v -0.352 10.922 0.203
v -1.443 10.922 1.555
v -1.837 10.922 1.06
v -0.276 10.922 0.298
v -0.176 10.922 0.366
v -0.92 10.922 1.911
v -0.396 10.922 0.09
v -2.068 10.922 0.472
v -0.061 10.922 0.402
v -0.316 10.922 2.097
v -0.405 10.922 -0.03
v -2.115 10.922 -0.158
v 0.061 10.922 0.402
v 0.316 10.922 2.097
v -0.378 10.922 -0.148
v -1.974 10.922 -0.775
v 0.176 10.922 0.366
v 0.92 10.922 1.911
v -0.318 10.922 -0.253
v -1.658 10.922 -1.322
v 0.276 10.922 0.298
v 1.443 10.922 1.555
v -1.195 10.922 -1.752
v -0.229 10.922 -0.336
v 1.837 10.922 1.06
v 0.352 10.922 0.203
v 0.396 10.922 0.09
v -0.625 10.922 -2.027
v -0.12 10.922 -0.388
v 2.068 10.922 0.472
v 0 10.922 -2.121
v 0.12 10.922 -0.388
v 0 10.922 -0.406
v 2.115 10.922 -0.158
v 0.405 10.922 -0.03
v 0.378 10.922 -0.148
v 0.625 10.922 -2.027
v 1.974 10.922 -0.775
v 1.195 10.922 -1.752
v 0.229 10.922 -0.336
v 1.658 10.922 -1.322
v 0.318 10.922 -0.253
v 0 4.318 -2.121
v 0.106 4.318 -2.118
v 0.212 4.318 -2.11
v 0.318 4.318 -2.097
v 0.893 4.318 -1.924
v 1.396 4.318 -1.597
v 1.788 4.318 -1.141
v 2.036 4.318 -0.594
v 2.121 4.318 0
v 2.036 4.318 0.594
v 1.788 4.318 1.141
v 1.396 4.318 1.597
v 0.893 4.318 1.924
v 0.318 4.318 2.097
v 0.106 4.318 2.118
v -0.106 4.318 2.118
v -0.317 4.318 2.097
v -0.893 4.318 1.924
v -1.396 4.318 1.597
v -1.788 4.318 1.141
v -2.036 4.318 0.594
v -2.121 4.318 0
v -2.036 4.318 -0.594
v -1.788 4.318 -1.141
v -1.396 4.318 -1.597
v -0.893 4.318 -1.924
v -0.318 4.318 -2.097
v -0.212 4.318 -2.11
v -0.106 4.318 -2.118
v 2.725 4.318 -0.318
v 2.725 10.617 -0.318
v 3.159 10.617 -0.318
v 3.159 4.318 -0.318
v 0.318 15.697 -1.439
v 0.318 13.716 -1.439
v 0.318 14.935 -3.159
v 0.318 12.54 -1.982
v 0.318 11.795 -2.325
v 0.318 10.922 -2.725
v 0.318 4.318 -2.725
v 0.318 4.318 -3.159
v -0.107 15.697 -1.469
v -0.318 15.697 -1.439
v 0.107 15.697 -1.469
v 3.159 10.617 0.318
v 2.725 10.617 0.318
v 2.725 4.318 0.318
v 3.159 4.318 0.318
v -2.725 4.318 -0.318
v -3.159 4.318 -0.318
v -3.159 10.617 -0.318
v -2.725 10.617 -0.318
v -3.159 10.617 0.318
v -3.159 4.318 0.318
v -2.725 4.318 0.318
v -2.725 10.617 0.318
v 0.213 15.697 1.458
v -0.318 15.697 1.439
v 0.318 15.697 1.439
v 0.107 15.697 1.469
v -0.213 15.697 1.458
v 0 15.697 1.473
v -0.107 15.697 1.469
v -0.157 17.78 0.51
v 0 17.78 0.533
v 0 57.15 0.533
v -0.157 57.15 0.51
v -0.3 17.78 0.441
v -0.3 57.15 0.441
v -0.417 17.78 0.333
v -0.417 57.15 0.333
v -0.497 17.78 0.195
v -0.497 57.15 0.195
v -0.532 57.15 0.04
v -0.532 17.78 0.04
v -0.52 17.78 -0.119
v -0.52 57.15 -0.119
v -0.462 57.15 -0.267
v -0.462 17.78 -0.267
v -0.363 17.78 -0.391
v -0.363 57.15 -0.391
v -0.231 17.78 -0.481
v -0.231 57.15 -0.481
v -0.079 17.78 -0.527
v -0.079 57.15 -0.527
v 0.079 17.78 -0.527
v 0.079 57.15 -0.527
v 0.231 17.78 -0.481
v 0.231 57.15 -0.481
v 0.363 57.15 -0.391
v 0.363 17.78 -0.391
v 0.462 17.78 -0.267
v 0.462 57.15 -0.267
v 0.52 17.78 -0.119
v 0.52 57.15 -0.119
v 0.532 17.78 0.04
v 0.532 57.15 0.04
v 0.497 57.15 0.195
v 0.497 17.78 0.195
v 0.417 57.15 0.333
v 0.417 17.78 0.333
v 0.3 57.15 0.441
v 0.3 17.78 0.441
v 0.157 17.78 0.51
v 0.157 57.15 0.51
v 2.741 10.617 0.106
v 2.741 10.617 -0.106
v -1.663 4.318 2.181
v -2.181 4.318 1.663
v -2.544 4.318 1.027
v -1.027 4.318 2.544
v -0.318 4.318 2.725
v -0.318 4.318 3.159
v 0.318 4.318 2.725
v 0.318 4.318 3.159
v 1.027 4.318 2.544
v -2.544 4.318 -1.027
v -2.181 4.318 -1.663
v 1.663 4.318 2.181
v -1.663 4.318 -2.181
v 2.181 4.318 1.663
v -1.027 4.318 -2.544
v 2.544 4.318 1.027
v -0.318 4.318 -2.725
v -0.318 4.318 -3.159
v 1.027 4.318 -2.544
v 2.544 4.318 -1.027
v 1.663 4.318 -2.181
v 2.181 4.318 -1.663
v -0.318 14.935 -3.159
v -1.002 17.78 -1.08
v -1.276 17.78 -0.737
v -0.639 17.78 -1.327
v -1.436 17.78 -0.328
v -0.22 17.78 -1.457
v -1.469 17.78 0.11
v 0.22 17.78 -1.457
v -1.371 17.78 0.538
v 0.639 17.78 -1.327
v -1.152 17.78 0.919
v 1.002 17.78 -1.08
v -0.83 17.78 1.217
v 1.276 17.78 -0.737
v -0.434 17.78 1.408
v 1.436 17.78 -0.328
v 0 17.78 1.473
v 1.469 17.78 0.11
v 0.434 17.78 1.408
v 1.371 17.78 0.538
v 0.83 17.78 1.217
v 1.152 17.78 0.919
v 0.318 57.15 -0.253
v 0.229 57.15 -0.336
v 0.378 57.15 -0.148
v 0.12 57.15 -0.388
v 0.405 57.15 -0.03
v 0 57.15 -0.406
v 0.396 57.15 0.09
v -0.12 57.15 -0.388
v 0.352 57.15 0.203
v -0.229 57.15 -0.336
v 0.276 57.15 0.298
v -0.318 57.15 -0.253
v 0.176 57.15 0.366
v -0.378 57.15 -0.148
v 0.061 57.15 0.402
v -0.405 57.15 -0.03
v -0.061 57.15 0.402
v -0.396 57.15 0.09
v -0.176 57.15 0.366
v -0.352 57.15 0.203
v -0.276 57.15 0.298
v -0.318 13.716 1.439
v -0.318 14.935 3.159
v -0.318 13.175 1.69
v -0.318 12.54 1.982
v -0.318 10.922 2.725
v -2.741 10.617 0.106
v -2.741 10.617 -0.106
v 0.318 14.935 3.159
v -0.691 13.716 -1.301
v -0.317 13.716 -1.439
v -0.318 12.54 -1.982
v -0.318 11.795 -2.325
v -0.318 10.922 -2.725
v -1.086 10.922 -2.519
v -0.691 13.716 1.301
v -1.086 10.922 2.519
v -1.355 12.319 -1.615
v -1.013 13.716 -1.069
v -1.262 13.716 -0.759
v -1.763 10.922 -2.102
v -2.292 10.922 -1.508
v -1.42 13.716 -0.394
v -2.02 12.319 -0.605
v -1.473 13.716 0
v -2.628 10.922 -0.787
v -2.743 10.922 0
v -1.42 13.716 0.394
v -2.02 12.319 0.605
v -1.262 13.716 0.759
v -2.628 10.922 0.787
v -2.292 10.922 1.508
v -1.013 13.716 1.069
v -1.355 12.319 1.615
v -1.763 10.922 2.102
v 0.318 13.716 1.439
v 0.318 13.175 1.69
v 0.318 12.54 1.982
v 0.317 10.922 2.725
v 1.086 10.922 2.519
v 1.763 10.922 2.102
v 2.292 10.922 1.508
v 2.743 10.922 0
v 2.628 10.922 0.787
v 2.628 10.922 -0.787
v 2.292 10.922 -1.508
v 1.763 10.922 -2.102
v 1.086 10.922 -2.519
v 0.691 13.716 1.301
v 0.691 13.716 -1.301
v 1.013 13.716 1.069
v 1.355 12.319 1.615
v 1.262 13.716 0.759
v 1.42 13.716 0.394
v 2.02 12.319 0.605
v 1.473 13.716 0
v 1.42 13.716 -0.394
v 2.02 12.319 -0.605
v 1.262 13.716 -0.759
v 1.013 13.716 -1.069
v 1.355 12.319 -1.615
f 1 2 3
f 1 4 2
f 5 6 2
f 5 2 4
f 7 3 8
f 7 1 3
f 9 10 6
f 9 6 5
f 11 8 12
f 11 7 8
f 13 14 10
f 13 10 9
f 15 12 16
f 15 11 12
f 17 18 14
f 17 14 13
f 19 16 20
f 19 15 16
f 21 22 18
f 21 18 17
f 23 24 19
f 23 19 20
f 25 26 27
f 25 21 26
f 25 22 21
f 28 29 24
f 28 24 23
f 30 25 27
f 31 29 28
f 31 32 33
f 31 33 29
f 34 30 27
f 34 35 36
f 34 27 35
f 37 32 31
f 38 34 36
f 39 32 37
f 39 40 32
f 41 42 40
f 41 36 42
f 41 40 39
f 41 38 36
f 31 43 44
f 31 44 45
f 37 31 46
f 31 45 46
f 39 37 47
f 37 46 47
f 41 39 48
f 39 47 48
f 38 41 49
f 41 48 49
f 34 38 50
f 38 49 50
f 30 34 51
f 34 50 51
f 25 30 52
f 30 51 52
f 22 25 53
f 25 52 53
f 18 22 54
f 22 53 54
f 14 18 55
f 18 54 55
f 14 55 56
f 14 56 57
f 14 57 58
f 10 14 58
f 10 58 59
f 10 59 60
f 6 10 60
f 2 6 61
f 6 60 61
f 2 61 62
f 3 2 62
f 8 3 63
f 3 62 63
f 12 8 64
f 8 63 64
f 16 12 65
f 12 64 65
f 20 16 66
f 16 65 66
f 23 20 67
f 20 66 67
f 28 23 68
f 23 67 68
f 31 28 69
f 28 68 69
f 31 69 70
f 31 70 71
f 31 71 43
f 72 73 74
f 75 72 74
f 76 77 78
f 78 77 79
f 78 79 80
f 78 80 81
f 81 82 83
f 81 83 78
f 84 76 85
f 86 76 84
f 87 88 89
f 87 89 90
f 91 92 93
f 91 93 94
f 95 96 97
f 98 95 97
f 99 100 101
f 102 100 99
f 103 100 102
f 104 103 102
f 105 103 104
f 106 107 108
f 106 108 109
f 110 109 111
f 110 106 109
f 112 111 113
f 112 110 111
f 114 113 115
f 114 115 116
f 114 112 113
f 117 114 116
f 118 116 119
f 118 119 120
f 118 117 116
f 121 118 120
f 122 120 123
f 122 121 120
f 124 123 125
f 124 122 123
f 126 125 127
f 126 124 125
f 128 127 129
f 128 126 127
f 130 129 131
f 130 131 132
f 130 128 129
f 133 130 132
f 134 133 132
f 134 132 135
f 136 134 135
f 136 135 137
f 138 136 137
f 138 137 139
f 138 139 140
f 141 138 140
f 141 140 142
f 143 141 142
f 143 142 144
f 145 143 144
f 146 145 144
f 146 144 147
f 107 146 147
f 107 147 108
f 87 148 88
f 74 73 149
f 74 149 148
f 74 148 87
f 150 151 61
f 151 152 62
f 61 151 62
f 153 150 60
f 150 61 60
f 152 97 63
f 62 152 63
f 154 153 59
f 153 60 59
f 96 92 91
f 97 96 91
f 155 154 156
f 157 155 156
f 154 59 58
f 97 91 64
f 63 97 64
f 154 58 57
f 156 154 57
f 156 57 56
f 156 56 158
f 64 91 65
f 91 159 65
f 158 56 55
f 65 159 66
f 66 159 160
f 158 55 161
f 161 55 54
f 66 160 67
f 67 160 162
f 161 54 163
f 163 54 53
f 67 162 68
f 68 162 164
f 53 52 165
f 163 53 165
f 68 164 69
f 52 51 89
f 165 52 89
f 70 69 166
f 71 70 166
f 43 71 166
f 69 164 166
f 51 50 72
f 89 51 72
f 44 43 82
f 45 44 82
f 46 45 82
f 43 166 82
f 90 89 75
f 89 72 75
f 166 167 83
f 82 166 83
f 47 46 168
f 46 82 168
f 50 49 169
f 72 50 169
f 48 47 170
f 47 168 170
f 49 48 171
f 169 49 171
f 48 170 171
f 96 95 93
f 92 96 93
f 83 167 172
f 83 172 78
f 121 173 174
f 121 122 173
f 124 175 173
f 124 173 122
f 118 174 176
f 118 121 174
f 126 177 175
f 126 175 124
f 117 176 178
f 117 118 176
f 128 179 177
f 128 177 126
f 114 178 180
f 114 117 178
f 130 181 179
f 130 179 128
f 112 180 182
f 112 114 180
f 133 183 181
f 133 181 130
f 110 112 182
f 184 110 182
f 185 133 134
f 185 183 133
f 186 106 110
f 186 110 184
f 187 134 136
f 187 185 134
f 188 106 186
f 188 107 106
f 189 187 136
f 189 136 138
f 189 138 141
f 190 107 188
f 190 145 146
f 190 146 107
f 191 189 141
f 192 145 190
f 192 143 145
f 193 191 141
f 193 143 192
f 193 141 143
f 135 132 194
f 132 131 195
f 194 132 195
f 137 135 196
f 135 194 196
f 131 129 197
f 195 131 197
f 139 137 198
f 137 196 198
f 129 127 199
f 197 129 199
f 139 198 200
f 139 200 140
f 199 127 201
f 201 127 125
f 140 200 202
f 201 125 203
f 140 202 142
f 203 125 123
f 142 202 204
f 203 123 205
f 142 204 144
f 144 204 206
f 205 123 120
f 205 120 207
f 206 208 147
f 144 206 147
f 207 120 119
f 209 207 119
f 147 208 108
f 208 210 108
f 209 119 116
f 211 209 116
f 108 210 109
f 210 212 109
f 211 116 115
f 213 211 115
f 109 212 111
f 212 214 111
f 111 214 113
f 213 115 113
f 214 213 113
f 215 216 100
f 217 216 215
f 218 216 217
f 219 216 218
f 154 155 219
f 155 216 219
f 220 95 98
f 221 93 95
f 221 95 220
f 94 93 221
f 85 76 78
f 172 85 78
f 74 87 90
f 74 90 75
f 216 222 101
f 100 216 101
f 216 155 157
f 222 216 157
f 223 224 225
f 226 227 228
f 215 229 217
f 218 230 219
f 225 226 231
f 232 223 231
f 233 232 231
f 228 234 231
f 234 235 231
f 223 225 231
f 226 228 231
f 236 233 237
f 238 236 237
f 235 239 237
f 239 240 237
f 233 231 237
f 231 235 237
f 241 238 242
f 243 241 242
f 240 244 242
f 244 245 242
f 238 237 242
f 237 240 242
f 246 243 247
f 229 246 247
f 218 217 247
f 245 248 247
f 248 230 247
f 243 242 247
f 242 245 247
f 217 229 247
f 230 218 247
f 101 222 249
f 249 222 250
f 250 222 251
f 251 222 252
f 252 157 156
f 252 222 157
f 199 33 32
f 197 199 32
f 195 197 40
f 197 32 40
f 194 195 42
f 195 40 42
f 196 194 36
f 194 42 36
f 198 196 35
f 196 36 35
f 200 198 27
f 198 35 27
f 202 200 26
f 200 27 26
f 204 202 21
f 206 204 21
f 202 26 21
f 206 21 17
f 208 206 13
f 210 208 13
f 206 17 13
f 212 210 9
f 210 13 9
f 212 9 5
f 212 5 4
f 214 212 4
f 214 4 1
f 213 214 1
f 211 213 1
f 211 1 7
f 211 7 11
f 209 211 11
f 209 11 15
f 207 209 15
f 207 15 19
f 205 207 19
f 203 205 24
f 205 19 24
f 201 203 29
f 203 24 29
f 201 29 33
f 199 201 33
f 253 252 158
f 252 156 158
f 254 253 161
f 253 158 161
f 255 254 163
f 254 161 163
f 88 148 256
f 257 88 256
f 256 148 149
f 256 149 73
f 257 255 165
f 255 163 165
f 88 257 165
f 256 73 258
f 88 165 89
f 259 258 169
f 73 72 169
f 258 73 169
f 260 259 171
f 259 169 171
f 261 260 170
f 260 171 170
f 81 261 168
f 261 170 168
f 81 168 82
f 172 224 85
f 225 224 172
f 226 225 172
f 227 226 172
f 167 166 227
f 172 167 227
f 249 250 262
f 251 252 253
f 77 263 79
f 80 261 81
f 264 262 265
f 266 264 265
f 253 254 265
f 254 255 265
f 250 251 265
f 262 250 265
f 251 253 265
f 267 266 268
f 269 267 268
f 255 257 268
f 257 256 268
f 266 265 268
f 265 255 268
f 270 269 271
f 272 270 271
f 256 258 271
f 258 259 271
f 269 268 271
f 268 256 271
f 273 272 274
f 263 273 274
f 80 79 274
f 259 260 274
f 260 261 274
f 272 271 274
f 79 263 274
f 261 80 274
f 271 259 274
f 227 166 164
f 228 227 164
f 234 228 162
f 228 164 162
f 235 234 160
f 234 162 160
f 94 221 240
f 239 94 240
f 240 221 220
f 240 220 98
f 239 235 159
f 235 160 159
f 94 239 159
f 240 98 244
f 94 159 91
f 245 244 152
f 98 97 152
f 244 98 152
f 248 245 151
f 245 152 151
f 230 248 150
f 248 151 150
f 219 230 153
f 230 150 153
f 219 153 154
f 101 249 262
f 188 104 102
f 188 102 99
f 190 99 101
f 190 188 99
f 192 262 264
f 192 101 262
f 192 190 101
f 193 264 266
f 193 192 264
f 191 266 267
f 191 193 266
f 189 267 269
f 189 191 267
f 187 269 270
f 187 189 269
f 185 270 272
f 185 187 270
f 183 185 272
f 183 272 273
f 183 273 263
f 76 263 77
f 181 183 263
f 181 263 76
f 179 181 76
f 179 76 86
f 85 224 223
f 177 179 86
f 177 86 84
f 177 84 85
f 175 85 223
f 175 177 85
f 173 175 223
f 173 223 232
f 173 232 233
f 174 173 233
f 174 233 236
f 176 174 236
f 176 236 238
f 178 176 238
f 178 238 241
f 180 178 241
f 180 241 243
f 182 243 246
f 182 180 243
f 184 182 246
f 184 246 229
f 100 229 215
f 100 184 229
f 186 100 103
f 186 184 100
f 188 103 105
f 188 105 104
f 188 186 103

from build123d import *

# Parameters (mm, degrees)
SKETCH1_R           = 2.7432
BOSS_EXTRUDE1_DEPTH = 17.78
SKETCH2_R           = 3.175
SKETCH2_R_2         = 1.4732
CUT_EXTRUDE1_DEPTH  = 4.064
SKETCH4_R           = 3.175
BOSS_EXTRUDE2_DEPTH = 2.9972
SKETCH5_W           = 0.635
SKETCH5_H           = 6.318170226
BOSS_EXTRUDE3_DEPTH = 12.7
SKETCH6_W           = 6.318170226
SKETCH6_H           = 0.635
BOSS_EXTRUDE4_DEPTH = 7.62
CUT_EXTRUDE2_DEPTH  = 7.62
SKETCH8_R           = 2.1209
CUT_EXTRUDE3_DEPTH  = 10.922
CUT_EXTRUDE4_START  = -6.858
SKETCH9_R           = 0.508
CUT_EXTRUDE4_DEPTH  = 6.858
SWEEP2_PITCH        = 2.54
SWEEP2_HEIGHT       = 1.143
SWEEP2_RADIUS       = 3.175
SWEEP2_START_ANGLE  = -90
SKETCH10_W          = 0.508
SKETCH10_H          = 0.762
SWEEP3_PITCH        = 2.54
SWEEP3_HEIGHT       = 1.143
SWEEP3_RADIUS       = 3.175
SWEEP3_START_ANGLE  = 90
SKETCH17_W          = 0.508
SKETCH17_H          = 0.762
SKETCH18_R          = 0.5334
SKETCH18_R_2        = 0.4064
BOSS_EXTRUDE6_DEPTH = 46.228
INTERSECT1_DEPTH    = 4.318


# Read off the part's stored shape, not the designer's step: Intersect1
with BuildPart() as part:
    # Sketch1 → Boss-Extrude1 (new body)
    with BuildSketch(Plane(origin=(0, 0, 0), x_dir=(1, 0, 0), z_dir=(0, 1, 0))):
        with Locations(Location((0, 0, 0), (0, 0, 270))):
            Circle(SKETCH1_R)
    extrude(amount=BOSS_EXTRUDE1_DEPTH)

    # Sketch2 → Cut-Extrude1 (cut)
    with BuildSketch(Plane(origin=(0, 17.78, 0), x_dir=(1, 0, 0), z_dir=(0, 1, 0))):
        Circle(SKETCH2_R)
        with Locations(Location((0, 0, 0), (0, 0, 270))):
            Circle(SKETCH2_R_2, mode=Mode.SUBTRACT)
    extrude(amount=-CUT_EXTRUDE1_DEPTH, mode=Mode.SUBTRACT)

    # Sketch3 → Cut-Revolve1 (revolve, cut)
    with BuildSketch(Plane.XY, mode=Mode.PRIVATE) as cut_revolve1_sk:
        Polygon((1.4732, 13.716), (2.7432, 10.922), (2.7432, 13.716), align=None)
    revolve(cut_revolve1_sk.sketch.rotate(Axis((0, 13.716, 0), (0, 1, 0)), 90), axis=Axis((0, 13.716, 0), (0, 1, 0)), mode=Mode.SUBTRACT)

    # Sketch4 → Boss-Extrude2 (add)
    with BuildSketch(Plane.XZ):
        with Locations(Location((0, 0, 0), (0, 0, 270))):
            Circle(SKETCH4_R)
    extrude(amount=-BOSS_EXTRUDE2_DEPTH)

    # Sketch5 → Boss-Extrude3 (add)
    with BuildSketch(Plane(origin=(0, 2.9972, 0), x_dir=(1, 0, 0), z_dir=(0, 1, 0))):
        Rectangle(SKETCH5_W, SKETCH5_H)
    extrude(amount=BOSS_EXTRUDE3_DEPTH)

    # Sketch6 → Boss-Extrude4 (add)
    with BuildSketch(Plane(origin=(0, 2.9972, 0), x_dir=(1, 0, 0), z_dir=(0, 1, 0))):
        Rectangle(SKETCH6_W, SKETCH6_H)
    extrude(amount=BOSS_EXTRUDE4_DEPTH)

    # Sketch7 → Cut-Extrude2 (cut)
    with BuildSketch(Plane(origin=(0.3175, 0, 0), x_dir=(0, 0, -1), z_dir=(1, 0, 0))):
        Polygon((1.438579852, 15.6972), (3.159085113, 14.9352), (3.159085113, 15.6972), align=None)
        Polygon((-1.438579852, 15.6972), (-3.159085113, 15.6972), (-3.159085113, 14.9352), align=None)
    extrude(amount=-CUT_EXTRUDE2_DEPTH, mode=Mode.SUBTRACT)

    # Sketch8 → Cut-Extrude3 (cut)
    with BuildSketch(Plane.XZ):
        with Locations(Location((0, 0, 0), (0, 0, 270))):
            Circle(SKETCH8_R)
    extrude(amount=-CUT_EXTRUDE3_DEPTH, mode=Mode.SUBTRACT)

    # Sketch9 → Cut-Extrude4 (cut)
    with BuildSketch(Plane(origin=(0, 17.78, 0), x_dir=(1, 0, 0), z_dir=(0, 1, 0)).offset(CUT_EXTRUDE4_START)):
        with Locations(Location((0, 0, 0), (0, 0, 270))):
            Circle(SKETCH9_R)
    extrude(amount=CUT_EXTRUDE4_DEPTH, mode=Mode.SUBTRACT)

    # Sweep2: sweep along a helix
    with BuildLine() as sweep2_path:
        add(Helix(SWEEP2_PITCH, SWEEP2_HEIGHT, SWEEP2_RADIUS, center=(0, 0.508, 0), direction=(0, 1, 0), mode=Mode.PRIVATE).rotate(Axis((0, 0.508, 0), (0, 1, 0)), SWEEP2_START_ANGLE))
    # Sketch10 → Sweep2 (sweep)
    with BuildSketch(Plane.XY):
        with Locations((-3.429, 0.889)):
            Rectangle(SKETCH10_W, SKETCH10_H)
    sweep(path=sweep2_path.line, is_frenet=True)

    # Sweep3: sweep along a helix
    with BuildLine() as sweep3_path:
        add(Helix(SWEEP3_PITCH, SWEEP3_HEIGHT, SWEEP3_RADIUS, center=(0, 0.508, 0), direction=(0, 1, 0), mode=Mode.PRIVATE).rotate(Axis((0, 0.508, 0), (0, 1, 0)), SWEEP3_START_ANGLE))
    # Sketch17 → Sweep3 (sweep)
    with BuildSketch(Plane.XY):
        with Locations((3.429, 0.889)):
            Rectangle(SKETCH17_W, SKETCH17_H)
    sweep(path=sweep3_path.line, is_frenet=True)

    # Sketch18 → Boss-Extrude6 (add)
    with BuildSketch(Plane.XZ.offset(-10.922)):
        with Locations(Location((0, 0, 0), (0, 0, 90))):
            Circle(SKETCH18_R)
        with Locations(Location((0, 0, 0), (0, 0, 270))):
            Circle(SKETCH18_R_2, mode=Mode.SUBTRACT)
    extrude(amount=-BOSS_EXTRUDE6_DEPTH)

    # Intersect1 outline → Intersect1 (cut)
    with BuildSketch(Plane(origin=(0, 0, 0), x_dir=(1, 0, 0), z_dir=(0, 1, 0))):
        with BuildLine():
            Line((-3.175, 0), (-3.683, 0))
            add(Edge.make_bspline(
                [(-3.683, 0), (-3.683, -1.196679241), (-2.97960959, -2.164813084), (-2.276219181, -3.132946927), (-1.13810959, -3.50274115), (0, -3.872535372), (1.13810959, -3.50274115), (2.276219181, -3.132946927), (2.97960959, -2.164813084), (3.322482299, -1.692889287), (3.50274115, -1.13810959)],
                knots=[0, 0, 0, 0.1, 0.1, 0.2, 0.2, 0.3, 0.3, 0.4, 0.4, 0.45, 0.45, 0.45], degree=2, weights=[1, 0.951056516, 1, 0.951056516, 1, 0.951056516, 1, 0.951056516, 1, 0.975528258, 0.975528258]))
            Line((3.50274115, -1.13810959), (3.019604439, -0.981128957))
            ThreePointArc((3.019604439, -0.981128957), (1.992470769, -2.471980023), (0.3175, -3.159085113))
            ThreePointArc((0.3175, -3.159085113), (0, -3.175), (-0.3175, -3.159085113))
            ThreePointArc((-0.3175, -3.159085113), (-2.24506403, -2.24506403), (-3.159085113, -0.3175))
            ThreePointArc((-3.159085113, -0.3175), (-3.171018782, -0.158949311), (-3.175, 0))
        make_face()
        with BuildLine():
            ThreePointArc((-3.159085113, 0.3175), (-3.171018782, 0.158949311), (-3.175, 0))
            ThreePointArc((-3.175, 0), (-3.171018782, -0.158949311), (-3.159085113, -0.3175))
            Line((-3.159085113, -0.3175), (-3.159085113, 0.3175))
        make_face()
        with BuildLine():
            ThreePointArc((0.3175, -3.159085113), (1.992470769, -2.471980023), (3.019604439, -0.981128957))
            ThreePointArc((3.019604439, -0.981128957), (3.107113129, -0.653049008), (3.159085113, -0.3175))
            Line((3.159085113, -0.3175), (2.724764208, -0.3175))
            ThreePointArc((2.724764208, -0.3175), (1.939735322, -1.939735322), (0.3175, -2.724764208))
            Line((0.3175, -2.724764208), (0.3175, -3.159085113))
        make_face()
        with BuildLine():
            ThreePointArc((-3.019604439, 0.981128957), (-3.107113129, 0.653049008), (-3.159085113, 0.3175))
            Line((-3.159085113, 0.3175), (-2.724764208, 0.3175))
            ThreePointArc((-2.724764208, 0.3175), (-1.939735322, 1.939735322), (-0.3175, 2.724764208))
            Line((-0.3175, 2.724764208), (-0.3175, 3.159085113))
            ThreePointArc((-0.3175, 3.159085113), (-1.992470769, 2.471980023), (-3.019604439, 0.981128957))
        make_face()
        with BuildLine():
            Line((-2.724764208, 0.3175), (-3.159085113, 0.3175))
            Line((-3.159085113, 0.3175), (-3.159085113, -0.3175))
            Line((-3.159085113, -0.3175), (-2.724764208, -0.3175))
            ThreePointArc((-2.724764208, -0.3175), (-2.7432, 0), (-2.724764208, 0.3175))
        make_face()
        with BuildLine():
            Line((-2.724764208, -0.3175), (-3.159085113, -0.3175))
            ThreePointArc((-3.159085113, -0.3175), (-2.24506403, -2.24506403), (-0.3175, -3.159085113))
            Line((-0.3175, -3.159085113), (-0.3175, -2.724764208))
            ThreePointArc((-0.3175, -2.724764208), (-1.939735322, -1.939735322), (-2.724764208, -0.3175))
        make_face()
        with BuildLine():
            Line((-0.3175, -3.159085113), (0.3175, -3.159085113))
            Line((0.3175, -3.159085113), (0.3175, -2.724764208))
            Line((0.3175, -2.724764208), (0.3175, -2.097000372))
            ThreePointArc((0.3175, -2.097000372), (0, -2.1209), (-0.3175, -2.097000372))
            Line((-0.3175, -2.097000372), (-0.3175, -2.724764208))
            Line((-0.3175, -2.724764208), (-0.3175, -3.159085113))
        make_face()
        with BuildLine():
            ThreePointArc((-0.3175, -3.159085113), (0, -3.175), (0.3175, -3.159085113))
            Line((0.3175, -3.159085113), (-0.3175, -3.159085113))
        make_face()
        with BuildLine():
            Line((3.159085113, 0.3175), (3.159085113, -0.3175))
            ThreePointArc((3.159085113, -0.3175), (3.171018782, -0.158949311), (3.175, 0))
            ThreePointArc((3.175, 0), (3.171018782, 0.158949311), (3.159085113, 0.3175))
        make_face()
        with BuildLine():
            Line((2.724764208, -0.3175), (3.159085113, -0.3175))
            Line((3.159085113, -0.3175), (3.159085113, 0.3175))
            Line((3.159085113, 0.3175), (2.724764208, 0.3175))
            ThreePointArc((2.724764208, 0.3175), (2.7432, 0), (2.724764208, -0.3175))
        make_face()
        with BuildLine():
            Line((-3.50274115, 1.13810959), (-3.019604439, 0.981128957))
            ThreePointArc((-3.019604439, 0.981128957), (-1.992470769, 2.471980023), (-0.3175, 3.159085113))
            ThreePointArc((-0.3175, 3.159085113), (0, 3.175), (0.3175, 3.159085113))
            ThreePointArc((0.3175, 3.159085113), (2.24506403, 2.24506403), (3.159085113, 0.3175))
            ThreePointArc((3.159085113, 0.3175), (3.171018782, 0.158949311), (3.175, 0))
            Line((3.175, 0), (3.683, 0))
            add(Edge.make_bspline(
                [(3.683, 0), (3.683, 1.196679241), (2.97960959, 2.164813084), (2.276219181, 3.132946927), (1.13810959, 3.50274115), (0, 3.872535372), (-1.13810959, 3.50274115), (-2.276219181, 3.132946927), (-2.97960959, 2.164813084), (-3.322482299, 1.692889287), (-3.50274115, 1.13810959)],
                knots=[0, 0, 0, 0.1, 0.1, 0.2, 0.2, 0.3, 0.3, 0.4, 0.4, 0.45, 0.45, 0.45], degree=2, weights=[1, 0.951056516, 1, 0.951056516, 1, 0.951056516, 1, 0.951056516, 1, 0.975528258, 0.975528258]))
        make_face()
        with BuildLine():
            ThreePointArc((-0.3175, 2.724764208), (-1.939735322, 1.939735322), (-2.724764208, 0.3175))
            ThreePointArc((-2.724764208, 0.3175), (-2.7432, 0), (-2.724764208, -0.3175))
            ThreePointArc((-2.724764208, -0.3175), (-1.939735322, -1.939735322), (-0.3175, -2.724764208))
            Line((-0.3175, -2.724764208), (-0.3175, -2.097000372))
            ThreePointArc((-0.3175, -2.097000372), (-2.1209, 0), (-0.3175, 2.097000372))
            Line((-0.3175, 2.097000372), (-0.3175, 2.724764208))
        make_face()
        with BuildLine():
            Line((0.3175, -2.097000372), (0.3175, -2.724764208))
            ThreePointArc((0.3175, -2.724764208), (1.939735322, -1.939735322), (2.724764208, -0.3175))
            ThreePointArc((2.724764208, -0.3175), (2.7432, 0), (2.724764208, 0.3175))
            ThreePointArc((2.724764208, 0.3175), (1.939735322, 1.939735322), (0.3175, 2.724764208))
            Line((0.3175, 2.724764208), (0.3175, 2.097000372))
            ThreePointArc((0.3175, 2.097000372), (1.608042686, 1.382901128), (2.1209, 0))
            ThreePointArc((2.1209, 0), (1.608042686, -1.382901128), (0.3175, -2.097000372))
        make_face()
        with BuildLine():
            Line((2.724764208, 0.3175), (3.159085113, 0.3175))
            ThreePointArc((3.159085113, 0.3175), (2.24506403, 2.24506403), (0.3175, 3.159085113))
            Line((0.3175, 3.159085113), (0.3175, 2.724764208))
            ThreePointArc((0.3175, 2.724764208), (1.939735322, 1.939735322), (2.724764208, 0.3175))
        make_face()
        with BuildLine():
            ThreePointArc((0.3175, 3.159085113), (0, 3.175), (-0.3175, 3.159085113))
            Line((-0.3175, 3.159085113), (0.3175, 3.159085113))
        make_face()
        with BuildLine():
            Line((0.3175, 3.159085113), (-0.3175, 3.159085113))
            Line((-0.3175, 3.159085113), (-0.3175, 2.724764208))
            Line((-0.3175, 2.724764208), (-0.3175, 2.097000372))
            ThreePointArc((-0.3175, 2.097000372), (0, 2.1209), (0.3175, 2.097000372))
            Line((0.3175, 2.097000372), (0.3175, 2.724764208))
            Line((0.3175, 2.724764208), (0.3175, 3.159085113))
        make_face()
    extrude(amount=INTERSECT1_DEPTH, mode=Mode.SUBTRACT)


solid = part.part
